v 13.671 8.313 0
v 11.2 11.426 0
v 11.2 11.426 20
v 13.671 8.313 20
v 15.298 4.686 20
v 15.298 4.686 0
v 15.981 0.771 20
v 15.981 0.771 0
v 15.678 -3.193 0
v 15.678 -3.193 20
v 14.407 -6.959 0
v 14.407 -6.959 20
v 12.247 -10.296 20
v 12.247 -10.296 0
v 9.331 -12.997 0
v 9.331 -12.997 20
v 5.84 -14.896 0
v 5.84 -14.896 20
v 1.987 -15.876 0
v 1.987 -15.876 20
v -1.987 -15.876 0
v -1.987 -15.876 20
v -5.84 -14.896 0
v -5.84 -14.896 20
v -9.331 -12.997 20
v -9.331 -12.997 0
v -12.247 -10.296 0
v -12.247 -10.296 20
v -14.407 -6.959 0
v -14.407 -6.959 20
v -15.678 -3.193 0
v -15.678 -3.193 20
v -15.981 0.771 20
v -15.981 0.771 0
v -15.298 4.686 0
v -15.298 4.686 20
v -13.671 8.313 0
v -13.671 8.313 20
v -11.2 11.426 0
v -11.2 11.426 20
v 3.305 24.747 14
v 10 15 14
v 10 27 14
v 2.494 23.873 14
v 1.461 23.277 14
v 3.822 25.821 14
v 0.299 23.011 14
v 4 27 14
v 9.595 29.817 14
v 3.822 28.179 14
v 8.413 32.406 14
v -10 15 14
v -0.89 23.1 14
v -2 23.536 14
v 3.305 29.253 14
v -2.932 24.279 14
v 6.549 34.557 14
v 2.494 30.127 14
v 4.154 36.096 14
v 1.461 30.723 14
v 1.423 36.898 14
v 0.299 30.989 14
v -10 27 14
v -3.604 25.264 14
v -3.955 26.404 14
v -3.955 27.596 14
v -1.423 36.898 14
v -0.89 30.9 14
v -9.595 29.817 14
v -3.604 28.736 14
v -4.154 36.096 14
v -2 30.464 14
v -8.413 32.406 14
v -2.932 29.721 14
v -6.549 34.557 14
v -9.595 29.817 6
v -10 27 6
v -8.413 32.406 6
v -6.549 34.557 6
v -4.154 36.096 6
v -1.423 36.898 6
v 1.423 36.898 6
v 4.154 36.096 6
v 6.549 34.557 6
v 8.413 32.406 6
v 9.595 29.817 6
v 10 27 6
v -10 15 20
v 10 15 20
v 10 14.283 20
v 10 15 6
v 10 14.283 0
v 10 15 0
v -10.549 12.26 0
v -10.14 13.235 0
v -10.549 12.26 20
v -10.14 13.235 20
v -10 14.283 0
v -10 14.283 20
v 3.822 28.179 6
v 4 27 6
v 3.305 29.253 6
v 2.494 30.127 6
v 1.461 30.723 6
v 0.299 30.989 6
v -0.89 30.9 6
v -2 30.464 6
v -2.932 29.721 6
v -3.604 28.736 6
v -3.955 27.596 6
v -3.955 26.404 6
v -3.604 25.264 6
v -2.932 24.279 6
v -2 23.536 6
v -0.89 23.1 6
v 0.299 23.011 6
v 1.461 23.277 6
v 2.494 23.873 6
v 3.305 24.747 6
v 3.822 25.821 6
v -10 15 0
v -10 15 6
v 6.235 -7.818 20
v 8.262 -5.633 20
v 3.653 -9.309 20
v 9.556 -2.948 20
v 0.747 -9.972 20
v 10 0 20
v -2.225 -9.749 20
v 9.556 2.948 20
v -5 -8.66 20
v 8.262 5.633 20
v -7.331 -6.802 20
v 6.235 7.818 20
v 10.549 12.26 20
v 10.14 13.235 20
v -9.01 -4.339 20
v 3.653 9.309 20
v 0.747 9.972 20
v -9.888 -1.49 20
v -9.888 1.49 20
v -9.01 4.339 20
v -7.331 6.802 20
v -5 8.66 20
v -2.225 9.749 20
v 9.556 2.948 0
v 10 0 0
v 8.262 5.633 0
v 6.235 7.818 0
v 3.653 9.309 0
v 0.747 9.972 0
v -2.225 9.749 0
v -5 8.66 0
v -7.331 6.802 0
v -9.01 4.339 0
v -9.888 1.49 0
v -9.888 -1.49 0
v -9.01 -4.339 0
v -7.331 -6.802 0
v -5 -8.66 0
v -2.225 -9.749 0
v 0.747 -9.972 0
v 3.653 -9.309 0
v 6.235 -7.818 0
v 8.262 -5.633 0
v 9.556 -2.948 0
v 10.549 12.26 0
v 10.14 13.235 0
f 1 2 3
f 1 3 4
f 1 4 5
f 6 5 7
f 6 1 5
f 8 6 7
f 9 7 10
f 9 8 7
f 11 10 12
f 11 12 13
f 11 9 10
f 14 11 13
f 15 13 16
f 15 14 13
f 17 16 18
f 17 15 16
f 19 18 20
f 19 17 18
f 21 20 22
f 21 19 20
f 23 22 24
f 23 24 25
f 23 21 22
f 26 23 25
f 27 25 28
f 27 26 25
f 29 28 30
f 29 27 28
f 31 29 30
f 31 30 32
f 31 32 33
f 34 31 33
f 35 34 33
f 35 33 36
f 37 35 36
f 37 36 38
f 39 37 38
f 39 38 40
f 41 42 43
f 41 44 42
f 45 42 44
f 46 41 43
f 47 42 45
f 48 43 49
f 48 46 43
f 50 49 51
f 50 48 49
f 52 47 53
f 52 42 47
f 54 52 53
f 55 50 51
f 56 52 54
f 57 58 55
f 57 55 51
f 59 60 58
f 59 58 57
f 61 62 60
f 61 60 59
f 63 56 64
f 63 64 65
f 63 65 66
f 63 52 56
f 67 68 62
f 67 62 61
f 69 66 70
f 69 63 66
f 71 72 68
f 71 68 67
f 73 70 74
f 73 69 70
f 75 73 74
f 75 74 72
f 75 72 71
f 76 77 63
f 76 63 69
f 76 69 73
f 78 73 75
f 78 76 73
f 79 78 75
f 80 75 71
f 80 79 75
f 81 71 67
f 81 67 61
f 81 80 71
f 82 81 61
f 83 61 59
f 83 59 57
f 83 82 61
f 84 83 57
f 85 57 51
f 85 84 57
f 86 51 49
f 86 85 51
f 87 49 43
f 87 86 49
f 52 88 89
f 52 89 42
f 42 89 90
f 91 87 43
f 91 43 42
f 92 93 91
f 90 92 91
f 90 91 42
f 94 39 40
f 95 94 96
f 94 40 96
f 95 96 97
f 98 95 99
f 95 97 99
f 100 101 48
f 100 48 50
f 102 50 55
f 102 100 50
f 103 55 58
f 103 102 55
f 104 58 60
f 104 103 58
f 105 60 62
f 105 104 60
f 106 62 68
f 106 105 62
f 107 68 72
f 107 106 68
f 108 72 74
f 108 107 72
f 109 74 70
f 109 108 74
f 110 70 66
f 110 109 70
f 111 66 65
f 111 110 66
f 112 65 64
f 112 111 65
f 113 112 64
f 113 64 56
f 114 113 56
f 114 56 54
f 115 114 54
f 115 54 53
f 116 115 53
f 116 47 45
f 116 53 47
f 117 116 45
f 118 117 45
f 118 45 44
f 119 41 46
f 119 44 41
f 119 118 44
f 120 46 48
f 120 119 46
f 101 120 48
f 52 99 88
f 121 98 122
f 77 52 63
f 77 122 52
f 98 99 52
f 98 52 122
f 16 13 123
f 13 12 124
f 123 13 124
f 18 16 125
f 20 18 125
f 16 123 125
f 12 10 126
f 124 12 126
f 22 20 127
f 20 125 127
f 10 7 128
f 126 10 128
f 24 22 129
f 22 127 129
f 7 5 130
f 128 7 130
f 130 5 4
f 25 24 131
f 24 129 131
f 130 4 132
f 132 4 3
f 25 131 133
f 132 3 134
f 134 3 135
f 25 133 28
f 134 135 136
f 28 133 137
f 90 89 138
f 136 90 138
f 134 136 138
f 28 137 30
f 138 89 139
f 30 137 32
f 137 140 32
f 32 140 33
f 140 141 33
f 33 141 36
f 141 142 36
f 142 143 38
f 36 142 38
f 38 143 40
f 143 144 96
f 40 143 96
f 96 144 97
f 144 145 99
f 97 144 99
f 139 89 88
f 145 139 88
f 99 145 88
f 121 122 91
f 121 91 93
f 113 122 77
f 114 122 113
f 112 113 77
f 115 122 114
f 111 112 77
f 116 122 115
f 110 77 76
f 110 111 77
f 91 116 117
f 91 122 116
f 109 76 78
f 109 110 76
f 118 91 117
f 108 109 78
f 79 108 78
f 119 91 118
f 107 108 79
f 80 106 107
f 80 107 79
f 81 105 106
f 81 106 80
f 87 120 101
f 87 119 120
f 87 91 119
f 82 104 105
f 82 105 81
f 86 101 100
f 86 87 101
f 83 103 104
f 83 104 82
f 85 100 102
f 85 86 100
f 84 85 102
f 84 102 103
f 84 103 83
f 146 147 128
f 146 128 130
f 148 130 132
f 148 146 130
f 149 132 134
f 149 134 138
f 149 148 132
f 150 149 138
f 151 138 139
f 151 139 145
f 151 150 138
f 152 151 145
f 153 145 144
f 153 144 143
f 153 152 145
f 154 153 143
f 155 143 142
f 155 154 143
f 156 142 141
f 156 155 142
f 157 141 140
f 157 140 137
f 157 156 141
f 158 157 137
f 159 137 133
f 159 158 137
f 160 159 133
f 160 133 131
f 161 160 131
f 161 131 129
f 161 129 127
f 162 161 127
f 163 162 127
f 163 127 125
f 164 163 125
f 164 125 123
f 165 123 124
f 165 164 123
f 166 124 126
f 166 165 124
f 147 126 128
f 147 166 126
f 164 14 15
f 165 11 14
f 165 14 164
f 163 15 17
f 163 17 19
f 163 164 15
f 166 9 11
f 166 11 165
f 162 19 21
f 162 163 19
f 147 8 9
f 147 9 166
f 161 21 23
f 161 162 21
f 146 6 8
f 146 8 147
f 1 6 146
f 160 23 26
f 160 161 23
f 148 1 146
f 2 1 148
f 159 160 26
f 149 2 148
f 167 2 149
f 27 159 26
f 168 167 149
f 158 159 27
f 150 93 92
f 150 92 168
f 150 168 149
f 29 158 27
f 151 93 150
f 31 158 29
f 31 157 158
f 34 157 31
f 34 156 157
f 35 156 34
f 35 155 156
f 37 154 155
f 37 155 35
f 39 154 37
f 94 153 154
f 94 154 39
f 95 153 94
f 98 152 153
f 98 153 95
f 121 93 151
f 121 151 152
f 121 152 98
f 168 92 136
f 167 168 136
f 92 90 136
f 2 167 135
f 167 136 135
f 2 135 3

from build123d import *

# Parameters (mm, degrees)
ESQUISSE1_R             = 10
ESQUISSE1_R_2           = 4
BASE_EXTRUSION_DEPTH    = 20
CONG_1_R                = 4
ESQUISSE4_W             = 14
ESQUISSE4_H             = 23
ENL_V_MAT_EXTRU_4_DEPTH = 10


with BuildPart() as part:
    # Esquisse1 → Base-Extrusion (new body)
    with BuildSketch(Plane.XY):
        with BuildLine():
            Line((10, 27), (10, 12.489995997))
            ThreePointArc((10, 12.489995997), (0, -16), (-10, 12.489995997))
            Line((-10, 12.489995997), (-10, 27))
            ThreePointArc((-10, 27), (0, 37), (10, 27))
        make_face()
        Circle(ESQUISSE1_R, mode=Mode.SUBTRACT)
        with Locations((0, 27)):
            Circle(ESQUISSE1_R_2, mode=Mode.SUBTRACT)
    extrude(amount=BASE_EXTRUSION_DEPTH)

    # Congé1
    cong_1_edges = [part.edges().sort_by_distance(p)[0] for p in [
        (10, 12.489995997, 10),
        (-10, 12.489995997, 10),
    ]]
    fillet(cong_1_edges, radius=CONG_1_R)

    # Esquisse4 → Enlèv. mat.-Extru.4 (cut, symmetric)
    with BuildSketch(Plane(origin=(0, 0, 0), x_dir=(0, 0, -1), z_dir=(1, 0, 0))):
        with Locations((-21, 26.5)):
            Rectangle(ESQUISSE4_W, ESQUISSE4_H)
        with Locations((1, 26.5)):
            Rectangle(ESQUISSE4_W, ESQUISSE4_H)
    extrude(amount=ENL_V_MAT_EXTRU_4_DEPTH, both=True, mode=Mode.SUBTRACT)


solid = part.part
